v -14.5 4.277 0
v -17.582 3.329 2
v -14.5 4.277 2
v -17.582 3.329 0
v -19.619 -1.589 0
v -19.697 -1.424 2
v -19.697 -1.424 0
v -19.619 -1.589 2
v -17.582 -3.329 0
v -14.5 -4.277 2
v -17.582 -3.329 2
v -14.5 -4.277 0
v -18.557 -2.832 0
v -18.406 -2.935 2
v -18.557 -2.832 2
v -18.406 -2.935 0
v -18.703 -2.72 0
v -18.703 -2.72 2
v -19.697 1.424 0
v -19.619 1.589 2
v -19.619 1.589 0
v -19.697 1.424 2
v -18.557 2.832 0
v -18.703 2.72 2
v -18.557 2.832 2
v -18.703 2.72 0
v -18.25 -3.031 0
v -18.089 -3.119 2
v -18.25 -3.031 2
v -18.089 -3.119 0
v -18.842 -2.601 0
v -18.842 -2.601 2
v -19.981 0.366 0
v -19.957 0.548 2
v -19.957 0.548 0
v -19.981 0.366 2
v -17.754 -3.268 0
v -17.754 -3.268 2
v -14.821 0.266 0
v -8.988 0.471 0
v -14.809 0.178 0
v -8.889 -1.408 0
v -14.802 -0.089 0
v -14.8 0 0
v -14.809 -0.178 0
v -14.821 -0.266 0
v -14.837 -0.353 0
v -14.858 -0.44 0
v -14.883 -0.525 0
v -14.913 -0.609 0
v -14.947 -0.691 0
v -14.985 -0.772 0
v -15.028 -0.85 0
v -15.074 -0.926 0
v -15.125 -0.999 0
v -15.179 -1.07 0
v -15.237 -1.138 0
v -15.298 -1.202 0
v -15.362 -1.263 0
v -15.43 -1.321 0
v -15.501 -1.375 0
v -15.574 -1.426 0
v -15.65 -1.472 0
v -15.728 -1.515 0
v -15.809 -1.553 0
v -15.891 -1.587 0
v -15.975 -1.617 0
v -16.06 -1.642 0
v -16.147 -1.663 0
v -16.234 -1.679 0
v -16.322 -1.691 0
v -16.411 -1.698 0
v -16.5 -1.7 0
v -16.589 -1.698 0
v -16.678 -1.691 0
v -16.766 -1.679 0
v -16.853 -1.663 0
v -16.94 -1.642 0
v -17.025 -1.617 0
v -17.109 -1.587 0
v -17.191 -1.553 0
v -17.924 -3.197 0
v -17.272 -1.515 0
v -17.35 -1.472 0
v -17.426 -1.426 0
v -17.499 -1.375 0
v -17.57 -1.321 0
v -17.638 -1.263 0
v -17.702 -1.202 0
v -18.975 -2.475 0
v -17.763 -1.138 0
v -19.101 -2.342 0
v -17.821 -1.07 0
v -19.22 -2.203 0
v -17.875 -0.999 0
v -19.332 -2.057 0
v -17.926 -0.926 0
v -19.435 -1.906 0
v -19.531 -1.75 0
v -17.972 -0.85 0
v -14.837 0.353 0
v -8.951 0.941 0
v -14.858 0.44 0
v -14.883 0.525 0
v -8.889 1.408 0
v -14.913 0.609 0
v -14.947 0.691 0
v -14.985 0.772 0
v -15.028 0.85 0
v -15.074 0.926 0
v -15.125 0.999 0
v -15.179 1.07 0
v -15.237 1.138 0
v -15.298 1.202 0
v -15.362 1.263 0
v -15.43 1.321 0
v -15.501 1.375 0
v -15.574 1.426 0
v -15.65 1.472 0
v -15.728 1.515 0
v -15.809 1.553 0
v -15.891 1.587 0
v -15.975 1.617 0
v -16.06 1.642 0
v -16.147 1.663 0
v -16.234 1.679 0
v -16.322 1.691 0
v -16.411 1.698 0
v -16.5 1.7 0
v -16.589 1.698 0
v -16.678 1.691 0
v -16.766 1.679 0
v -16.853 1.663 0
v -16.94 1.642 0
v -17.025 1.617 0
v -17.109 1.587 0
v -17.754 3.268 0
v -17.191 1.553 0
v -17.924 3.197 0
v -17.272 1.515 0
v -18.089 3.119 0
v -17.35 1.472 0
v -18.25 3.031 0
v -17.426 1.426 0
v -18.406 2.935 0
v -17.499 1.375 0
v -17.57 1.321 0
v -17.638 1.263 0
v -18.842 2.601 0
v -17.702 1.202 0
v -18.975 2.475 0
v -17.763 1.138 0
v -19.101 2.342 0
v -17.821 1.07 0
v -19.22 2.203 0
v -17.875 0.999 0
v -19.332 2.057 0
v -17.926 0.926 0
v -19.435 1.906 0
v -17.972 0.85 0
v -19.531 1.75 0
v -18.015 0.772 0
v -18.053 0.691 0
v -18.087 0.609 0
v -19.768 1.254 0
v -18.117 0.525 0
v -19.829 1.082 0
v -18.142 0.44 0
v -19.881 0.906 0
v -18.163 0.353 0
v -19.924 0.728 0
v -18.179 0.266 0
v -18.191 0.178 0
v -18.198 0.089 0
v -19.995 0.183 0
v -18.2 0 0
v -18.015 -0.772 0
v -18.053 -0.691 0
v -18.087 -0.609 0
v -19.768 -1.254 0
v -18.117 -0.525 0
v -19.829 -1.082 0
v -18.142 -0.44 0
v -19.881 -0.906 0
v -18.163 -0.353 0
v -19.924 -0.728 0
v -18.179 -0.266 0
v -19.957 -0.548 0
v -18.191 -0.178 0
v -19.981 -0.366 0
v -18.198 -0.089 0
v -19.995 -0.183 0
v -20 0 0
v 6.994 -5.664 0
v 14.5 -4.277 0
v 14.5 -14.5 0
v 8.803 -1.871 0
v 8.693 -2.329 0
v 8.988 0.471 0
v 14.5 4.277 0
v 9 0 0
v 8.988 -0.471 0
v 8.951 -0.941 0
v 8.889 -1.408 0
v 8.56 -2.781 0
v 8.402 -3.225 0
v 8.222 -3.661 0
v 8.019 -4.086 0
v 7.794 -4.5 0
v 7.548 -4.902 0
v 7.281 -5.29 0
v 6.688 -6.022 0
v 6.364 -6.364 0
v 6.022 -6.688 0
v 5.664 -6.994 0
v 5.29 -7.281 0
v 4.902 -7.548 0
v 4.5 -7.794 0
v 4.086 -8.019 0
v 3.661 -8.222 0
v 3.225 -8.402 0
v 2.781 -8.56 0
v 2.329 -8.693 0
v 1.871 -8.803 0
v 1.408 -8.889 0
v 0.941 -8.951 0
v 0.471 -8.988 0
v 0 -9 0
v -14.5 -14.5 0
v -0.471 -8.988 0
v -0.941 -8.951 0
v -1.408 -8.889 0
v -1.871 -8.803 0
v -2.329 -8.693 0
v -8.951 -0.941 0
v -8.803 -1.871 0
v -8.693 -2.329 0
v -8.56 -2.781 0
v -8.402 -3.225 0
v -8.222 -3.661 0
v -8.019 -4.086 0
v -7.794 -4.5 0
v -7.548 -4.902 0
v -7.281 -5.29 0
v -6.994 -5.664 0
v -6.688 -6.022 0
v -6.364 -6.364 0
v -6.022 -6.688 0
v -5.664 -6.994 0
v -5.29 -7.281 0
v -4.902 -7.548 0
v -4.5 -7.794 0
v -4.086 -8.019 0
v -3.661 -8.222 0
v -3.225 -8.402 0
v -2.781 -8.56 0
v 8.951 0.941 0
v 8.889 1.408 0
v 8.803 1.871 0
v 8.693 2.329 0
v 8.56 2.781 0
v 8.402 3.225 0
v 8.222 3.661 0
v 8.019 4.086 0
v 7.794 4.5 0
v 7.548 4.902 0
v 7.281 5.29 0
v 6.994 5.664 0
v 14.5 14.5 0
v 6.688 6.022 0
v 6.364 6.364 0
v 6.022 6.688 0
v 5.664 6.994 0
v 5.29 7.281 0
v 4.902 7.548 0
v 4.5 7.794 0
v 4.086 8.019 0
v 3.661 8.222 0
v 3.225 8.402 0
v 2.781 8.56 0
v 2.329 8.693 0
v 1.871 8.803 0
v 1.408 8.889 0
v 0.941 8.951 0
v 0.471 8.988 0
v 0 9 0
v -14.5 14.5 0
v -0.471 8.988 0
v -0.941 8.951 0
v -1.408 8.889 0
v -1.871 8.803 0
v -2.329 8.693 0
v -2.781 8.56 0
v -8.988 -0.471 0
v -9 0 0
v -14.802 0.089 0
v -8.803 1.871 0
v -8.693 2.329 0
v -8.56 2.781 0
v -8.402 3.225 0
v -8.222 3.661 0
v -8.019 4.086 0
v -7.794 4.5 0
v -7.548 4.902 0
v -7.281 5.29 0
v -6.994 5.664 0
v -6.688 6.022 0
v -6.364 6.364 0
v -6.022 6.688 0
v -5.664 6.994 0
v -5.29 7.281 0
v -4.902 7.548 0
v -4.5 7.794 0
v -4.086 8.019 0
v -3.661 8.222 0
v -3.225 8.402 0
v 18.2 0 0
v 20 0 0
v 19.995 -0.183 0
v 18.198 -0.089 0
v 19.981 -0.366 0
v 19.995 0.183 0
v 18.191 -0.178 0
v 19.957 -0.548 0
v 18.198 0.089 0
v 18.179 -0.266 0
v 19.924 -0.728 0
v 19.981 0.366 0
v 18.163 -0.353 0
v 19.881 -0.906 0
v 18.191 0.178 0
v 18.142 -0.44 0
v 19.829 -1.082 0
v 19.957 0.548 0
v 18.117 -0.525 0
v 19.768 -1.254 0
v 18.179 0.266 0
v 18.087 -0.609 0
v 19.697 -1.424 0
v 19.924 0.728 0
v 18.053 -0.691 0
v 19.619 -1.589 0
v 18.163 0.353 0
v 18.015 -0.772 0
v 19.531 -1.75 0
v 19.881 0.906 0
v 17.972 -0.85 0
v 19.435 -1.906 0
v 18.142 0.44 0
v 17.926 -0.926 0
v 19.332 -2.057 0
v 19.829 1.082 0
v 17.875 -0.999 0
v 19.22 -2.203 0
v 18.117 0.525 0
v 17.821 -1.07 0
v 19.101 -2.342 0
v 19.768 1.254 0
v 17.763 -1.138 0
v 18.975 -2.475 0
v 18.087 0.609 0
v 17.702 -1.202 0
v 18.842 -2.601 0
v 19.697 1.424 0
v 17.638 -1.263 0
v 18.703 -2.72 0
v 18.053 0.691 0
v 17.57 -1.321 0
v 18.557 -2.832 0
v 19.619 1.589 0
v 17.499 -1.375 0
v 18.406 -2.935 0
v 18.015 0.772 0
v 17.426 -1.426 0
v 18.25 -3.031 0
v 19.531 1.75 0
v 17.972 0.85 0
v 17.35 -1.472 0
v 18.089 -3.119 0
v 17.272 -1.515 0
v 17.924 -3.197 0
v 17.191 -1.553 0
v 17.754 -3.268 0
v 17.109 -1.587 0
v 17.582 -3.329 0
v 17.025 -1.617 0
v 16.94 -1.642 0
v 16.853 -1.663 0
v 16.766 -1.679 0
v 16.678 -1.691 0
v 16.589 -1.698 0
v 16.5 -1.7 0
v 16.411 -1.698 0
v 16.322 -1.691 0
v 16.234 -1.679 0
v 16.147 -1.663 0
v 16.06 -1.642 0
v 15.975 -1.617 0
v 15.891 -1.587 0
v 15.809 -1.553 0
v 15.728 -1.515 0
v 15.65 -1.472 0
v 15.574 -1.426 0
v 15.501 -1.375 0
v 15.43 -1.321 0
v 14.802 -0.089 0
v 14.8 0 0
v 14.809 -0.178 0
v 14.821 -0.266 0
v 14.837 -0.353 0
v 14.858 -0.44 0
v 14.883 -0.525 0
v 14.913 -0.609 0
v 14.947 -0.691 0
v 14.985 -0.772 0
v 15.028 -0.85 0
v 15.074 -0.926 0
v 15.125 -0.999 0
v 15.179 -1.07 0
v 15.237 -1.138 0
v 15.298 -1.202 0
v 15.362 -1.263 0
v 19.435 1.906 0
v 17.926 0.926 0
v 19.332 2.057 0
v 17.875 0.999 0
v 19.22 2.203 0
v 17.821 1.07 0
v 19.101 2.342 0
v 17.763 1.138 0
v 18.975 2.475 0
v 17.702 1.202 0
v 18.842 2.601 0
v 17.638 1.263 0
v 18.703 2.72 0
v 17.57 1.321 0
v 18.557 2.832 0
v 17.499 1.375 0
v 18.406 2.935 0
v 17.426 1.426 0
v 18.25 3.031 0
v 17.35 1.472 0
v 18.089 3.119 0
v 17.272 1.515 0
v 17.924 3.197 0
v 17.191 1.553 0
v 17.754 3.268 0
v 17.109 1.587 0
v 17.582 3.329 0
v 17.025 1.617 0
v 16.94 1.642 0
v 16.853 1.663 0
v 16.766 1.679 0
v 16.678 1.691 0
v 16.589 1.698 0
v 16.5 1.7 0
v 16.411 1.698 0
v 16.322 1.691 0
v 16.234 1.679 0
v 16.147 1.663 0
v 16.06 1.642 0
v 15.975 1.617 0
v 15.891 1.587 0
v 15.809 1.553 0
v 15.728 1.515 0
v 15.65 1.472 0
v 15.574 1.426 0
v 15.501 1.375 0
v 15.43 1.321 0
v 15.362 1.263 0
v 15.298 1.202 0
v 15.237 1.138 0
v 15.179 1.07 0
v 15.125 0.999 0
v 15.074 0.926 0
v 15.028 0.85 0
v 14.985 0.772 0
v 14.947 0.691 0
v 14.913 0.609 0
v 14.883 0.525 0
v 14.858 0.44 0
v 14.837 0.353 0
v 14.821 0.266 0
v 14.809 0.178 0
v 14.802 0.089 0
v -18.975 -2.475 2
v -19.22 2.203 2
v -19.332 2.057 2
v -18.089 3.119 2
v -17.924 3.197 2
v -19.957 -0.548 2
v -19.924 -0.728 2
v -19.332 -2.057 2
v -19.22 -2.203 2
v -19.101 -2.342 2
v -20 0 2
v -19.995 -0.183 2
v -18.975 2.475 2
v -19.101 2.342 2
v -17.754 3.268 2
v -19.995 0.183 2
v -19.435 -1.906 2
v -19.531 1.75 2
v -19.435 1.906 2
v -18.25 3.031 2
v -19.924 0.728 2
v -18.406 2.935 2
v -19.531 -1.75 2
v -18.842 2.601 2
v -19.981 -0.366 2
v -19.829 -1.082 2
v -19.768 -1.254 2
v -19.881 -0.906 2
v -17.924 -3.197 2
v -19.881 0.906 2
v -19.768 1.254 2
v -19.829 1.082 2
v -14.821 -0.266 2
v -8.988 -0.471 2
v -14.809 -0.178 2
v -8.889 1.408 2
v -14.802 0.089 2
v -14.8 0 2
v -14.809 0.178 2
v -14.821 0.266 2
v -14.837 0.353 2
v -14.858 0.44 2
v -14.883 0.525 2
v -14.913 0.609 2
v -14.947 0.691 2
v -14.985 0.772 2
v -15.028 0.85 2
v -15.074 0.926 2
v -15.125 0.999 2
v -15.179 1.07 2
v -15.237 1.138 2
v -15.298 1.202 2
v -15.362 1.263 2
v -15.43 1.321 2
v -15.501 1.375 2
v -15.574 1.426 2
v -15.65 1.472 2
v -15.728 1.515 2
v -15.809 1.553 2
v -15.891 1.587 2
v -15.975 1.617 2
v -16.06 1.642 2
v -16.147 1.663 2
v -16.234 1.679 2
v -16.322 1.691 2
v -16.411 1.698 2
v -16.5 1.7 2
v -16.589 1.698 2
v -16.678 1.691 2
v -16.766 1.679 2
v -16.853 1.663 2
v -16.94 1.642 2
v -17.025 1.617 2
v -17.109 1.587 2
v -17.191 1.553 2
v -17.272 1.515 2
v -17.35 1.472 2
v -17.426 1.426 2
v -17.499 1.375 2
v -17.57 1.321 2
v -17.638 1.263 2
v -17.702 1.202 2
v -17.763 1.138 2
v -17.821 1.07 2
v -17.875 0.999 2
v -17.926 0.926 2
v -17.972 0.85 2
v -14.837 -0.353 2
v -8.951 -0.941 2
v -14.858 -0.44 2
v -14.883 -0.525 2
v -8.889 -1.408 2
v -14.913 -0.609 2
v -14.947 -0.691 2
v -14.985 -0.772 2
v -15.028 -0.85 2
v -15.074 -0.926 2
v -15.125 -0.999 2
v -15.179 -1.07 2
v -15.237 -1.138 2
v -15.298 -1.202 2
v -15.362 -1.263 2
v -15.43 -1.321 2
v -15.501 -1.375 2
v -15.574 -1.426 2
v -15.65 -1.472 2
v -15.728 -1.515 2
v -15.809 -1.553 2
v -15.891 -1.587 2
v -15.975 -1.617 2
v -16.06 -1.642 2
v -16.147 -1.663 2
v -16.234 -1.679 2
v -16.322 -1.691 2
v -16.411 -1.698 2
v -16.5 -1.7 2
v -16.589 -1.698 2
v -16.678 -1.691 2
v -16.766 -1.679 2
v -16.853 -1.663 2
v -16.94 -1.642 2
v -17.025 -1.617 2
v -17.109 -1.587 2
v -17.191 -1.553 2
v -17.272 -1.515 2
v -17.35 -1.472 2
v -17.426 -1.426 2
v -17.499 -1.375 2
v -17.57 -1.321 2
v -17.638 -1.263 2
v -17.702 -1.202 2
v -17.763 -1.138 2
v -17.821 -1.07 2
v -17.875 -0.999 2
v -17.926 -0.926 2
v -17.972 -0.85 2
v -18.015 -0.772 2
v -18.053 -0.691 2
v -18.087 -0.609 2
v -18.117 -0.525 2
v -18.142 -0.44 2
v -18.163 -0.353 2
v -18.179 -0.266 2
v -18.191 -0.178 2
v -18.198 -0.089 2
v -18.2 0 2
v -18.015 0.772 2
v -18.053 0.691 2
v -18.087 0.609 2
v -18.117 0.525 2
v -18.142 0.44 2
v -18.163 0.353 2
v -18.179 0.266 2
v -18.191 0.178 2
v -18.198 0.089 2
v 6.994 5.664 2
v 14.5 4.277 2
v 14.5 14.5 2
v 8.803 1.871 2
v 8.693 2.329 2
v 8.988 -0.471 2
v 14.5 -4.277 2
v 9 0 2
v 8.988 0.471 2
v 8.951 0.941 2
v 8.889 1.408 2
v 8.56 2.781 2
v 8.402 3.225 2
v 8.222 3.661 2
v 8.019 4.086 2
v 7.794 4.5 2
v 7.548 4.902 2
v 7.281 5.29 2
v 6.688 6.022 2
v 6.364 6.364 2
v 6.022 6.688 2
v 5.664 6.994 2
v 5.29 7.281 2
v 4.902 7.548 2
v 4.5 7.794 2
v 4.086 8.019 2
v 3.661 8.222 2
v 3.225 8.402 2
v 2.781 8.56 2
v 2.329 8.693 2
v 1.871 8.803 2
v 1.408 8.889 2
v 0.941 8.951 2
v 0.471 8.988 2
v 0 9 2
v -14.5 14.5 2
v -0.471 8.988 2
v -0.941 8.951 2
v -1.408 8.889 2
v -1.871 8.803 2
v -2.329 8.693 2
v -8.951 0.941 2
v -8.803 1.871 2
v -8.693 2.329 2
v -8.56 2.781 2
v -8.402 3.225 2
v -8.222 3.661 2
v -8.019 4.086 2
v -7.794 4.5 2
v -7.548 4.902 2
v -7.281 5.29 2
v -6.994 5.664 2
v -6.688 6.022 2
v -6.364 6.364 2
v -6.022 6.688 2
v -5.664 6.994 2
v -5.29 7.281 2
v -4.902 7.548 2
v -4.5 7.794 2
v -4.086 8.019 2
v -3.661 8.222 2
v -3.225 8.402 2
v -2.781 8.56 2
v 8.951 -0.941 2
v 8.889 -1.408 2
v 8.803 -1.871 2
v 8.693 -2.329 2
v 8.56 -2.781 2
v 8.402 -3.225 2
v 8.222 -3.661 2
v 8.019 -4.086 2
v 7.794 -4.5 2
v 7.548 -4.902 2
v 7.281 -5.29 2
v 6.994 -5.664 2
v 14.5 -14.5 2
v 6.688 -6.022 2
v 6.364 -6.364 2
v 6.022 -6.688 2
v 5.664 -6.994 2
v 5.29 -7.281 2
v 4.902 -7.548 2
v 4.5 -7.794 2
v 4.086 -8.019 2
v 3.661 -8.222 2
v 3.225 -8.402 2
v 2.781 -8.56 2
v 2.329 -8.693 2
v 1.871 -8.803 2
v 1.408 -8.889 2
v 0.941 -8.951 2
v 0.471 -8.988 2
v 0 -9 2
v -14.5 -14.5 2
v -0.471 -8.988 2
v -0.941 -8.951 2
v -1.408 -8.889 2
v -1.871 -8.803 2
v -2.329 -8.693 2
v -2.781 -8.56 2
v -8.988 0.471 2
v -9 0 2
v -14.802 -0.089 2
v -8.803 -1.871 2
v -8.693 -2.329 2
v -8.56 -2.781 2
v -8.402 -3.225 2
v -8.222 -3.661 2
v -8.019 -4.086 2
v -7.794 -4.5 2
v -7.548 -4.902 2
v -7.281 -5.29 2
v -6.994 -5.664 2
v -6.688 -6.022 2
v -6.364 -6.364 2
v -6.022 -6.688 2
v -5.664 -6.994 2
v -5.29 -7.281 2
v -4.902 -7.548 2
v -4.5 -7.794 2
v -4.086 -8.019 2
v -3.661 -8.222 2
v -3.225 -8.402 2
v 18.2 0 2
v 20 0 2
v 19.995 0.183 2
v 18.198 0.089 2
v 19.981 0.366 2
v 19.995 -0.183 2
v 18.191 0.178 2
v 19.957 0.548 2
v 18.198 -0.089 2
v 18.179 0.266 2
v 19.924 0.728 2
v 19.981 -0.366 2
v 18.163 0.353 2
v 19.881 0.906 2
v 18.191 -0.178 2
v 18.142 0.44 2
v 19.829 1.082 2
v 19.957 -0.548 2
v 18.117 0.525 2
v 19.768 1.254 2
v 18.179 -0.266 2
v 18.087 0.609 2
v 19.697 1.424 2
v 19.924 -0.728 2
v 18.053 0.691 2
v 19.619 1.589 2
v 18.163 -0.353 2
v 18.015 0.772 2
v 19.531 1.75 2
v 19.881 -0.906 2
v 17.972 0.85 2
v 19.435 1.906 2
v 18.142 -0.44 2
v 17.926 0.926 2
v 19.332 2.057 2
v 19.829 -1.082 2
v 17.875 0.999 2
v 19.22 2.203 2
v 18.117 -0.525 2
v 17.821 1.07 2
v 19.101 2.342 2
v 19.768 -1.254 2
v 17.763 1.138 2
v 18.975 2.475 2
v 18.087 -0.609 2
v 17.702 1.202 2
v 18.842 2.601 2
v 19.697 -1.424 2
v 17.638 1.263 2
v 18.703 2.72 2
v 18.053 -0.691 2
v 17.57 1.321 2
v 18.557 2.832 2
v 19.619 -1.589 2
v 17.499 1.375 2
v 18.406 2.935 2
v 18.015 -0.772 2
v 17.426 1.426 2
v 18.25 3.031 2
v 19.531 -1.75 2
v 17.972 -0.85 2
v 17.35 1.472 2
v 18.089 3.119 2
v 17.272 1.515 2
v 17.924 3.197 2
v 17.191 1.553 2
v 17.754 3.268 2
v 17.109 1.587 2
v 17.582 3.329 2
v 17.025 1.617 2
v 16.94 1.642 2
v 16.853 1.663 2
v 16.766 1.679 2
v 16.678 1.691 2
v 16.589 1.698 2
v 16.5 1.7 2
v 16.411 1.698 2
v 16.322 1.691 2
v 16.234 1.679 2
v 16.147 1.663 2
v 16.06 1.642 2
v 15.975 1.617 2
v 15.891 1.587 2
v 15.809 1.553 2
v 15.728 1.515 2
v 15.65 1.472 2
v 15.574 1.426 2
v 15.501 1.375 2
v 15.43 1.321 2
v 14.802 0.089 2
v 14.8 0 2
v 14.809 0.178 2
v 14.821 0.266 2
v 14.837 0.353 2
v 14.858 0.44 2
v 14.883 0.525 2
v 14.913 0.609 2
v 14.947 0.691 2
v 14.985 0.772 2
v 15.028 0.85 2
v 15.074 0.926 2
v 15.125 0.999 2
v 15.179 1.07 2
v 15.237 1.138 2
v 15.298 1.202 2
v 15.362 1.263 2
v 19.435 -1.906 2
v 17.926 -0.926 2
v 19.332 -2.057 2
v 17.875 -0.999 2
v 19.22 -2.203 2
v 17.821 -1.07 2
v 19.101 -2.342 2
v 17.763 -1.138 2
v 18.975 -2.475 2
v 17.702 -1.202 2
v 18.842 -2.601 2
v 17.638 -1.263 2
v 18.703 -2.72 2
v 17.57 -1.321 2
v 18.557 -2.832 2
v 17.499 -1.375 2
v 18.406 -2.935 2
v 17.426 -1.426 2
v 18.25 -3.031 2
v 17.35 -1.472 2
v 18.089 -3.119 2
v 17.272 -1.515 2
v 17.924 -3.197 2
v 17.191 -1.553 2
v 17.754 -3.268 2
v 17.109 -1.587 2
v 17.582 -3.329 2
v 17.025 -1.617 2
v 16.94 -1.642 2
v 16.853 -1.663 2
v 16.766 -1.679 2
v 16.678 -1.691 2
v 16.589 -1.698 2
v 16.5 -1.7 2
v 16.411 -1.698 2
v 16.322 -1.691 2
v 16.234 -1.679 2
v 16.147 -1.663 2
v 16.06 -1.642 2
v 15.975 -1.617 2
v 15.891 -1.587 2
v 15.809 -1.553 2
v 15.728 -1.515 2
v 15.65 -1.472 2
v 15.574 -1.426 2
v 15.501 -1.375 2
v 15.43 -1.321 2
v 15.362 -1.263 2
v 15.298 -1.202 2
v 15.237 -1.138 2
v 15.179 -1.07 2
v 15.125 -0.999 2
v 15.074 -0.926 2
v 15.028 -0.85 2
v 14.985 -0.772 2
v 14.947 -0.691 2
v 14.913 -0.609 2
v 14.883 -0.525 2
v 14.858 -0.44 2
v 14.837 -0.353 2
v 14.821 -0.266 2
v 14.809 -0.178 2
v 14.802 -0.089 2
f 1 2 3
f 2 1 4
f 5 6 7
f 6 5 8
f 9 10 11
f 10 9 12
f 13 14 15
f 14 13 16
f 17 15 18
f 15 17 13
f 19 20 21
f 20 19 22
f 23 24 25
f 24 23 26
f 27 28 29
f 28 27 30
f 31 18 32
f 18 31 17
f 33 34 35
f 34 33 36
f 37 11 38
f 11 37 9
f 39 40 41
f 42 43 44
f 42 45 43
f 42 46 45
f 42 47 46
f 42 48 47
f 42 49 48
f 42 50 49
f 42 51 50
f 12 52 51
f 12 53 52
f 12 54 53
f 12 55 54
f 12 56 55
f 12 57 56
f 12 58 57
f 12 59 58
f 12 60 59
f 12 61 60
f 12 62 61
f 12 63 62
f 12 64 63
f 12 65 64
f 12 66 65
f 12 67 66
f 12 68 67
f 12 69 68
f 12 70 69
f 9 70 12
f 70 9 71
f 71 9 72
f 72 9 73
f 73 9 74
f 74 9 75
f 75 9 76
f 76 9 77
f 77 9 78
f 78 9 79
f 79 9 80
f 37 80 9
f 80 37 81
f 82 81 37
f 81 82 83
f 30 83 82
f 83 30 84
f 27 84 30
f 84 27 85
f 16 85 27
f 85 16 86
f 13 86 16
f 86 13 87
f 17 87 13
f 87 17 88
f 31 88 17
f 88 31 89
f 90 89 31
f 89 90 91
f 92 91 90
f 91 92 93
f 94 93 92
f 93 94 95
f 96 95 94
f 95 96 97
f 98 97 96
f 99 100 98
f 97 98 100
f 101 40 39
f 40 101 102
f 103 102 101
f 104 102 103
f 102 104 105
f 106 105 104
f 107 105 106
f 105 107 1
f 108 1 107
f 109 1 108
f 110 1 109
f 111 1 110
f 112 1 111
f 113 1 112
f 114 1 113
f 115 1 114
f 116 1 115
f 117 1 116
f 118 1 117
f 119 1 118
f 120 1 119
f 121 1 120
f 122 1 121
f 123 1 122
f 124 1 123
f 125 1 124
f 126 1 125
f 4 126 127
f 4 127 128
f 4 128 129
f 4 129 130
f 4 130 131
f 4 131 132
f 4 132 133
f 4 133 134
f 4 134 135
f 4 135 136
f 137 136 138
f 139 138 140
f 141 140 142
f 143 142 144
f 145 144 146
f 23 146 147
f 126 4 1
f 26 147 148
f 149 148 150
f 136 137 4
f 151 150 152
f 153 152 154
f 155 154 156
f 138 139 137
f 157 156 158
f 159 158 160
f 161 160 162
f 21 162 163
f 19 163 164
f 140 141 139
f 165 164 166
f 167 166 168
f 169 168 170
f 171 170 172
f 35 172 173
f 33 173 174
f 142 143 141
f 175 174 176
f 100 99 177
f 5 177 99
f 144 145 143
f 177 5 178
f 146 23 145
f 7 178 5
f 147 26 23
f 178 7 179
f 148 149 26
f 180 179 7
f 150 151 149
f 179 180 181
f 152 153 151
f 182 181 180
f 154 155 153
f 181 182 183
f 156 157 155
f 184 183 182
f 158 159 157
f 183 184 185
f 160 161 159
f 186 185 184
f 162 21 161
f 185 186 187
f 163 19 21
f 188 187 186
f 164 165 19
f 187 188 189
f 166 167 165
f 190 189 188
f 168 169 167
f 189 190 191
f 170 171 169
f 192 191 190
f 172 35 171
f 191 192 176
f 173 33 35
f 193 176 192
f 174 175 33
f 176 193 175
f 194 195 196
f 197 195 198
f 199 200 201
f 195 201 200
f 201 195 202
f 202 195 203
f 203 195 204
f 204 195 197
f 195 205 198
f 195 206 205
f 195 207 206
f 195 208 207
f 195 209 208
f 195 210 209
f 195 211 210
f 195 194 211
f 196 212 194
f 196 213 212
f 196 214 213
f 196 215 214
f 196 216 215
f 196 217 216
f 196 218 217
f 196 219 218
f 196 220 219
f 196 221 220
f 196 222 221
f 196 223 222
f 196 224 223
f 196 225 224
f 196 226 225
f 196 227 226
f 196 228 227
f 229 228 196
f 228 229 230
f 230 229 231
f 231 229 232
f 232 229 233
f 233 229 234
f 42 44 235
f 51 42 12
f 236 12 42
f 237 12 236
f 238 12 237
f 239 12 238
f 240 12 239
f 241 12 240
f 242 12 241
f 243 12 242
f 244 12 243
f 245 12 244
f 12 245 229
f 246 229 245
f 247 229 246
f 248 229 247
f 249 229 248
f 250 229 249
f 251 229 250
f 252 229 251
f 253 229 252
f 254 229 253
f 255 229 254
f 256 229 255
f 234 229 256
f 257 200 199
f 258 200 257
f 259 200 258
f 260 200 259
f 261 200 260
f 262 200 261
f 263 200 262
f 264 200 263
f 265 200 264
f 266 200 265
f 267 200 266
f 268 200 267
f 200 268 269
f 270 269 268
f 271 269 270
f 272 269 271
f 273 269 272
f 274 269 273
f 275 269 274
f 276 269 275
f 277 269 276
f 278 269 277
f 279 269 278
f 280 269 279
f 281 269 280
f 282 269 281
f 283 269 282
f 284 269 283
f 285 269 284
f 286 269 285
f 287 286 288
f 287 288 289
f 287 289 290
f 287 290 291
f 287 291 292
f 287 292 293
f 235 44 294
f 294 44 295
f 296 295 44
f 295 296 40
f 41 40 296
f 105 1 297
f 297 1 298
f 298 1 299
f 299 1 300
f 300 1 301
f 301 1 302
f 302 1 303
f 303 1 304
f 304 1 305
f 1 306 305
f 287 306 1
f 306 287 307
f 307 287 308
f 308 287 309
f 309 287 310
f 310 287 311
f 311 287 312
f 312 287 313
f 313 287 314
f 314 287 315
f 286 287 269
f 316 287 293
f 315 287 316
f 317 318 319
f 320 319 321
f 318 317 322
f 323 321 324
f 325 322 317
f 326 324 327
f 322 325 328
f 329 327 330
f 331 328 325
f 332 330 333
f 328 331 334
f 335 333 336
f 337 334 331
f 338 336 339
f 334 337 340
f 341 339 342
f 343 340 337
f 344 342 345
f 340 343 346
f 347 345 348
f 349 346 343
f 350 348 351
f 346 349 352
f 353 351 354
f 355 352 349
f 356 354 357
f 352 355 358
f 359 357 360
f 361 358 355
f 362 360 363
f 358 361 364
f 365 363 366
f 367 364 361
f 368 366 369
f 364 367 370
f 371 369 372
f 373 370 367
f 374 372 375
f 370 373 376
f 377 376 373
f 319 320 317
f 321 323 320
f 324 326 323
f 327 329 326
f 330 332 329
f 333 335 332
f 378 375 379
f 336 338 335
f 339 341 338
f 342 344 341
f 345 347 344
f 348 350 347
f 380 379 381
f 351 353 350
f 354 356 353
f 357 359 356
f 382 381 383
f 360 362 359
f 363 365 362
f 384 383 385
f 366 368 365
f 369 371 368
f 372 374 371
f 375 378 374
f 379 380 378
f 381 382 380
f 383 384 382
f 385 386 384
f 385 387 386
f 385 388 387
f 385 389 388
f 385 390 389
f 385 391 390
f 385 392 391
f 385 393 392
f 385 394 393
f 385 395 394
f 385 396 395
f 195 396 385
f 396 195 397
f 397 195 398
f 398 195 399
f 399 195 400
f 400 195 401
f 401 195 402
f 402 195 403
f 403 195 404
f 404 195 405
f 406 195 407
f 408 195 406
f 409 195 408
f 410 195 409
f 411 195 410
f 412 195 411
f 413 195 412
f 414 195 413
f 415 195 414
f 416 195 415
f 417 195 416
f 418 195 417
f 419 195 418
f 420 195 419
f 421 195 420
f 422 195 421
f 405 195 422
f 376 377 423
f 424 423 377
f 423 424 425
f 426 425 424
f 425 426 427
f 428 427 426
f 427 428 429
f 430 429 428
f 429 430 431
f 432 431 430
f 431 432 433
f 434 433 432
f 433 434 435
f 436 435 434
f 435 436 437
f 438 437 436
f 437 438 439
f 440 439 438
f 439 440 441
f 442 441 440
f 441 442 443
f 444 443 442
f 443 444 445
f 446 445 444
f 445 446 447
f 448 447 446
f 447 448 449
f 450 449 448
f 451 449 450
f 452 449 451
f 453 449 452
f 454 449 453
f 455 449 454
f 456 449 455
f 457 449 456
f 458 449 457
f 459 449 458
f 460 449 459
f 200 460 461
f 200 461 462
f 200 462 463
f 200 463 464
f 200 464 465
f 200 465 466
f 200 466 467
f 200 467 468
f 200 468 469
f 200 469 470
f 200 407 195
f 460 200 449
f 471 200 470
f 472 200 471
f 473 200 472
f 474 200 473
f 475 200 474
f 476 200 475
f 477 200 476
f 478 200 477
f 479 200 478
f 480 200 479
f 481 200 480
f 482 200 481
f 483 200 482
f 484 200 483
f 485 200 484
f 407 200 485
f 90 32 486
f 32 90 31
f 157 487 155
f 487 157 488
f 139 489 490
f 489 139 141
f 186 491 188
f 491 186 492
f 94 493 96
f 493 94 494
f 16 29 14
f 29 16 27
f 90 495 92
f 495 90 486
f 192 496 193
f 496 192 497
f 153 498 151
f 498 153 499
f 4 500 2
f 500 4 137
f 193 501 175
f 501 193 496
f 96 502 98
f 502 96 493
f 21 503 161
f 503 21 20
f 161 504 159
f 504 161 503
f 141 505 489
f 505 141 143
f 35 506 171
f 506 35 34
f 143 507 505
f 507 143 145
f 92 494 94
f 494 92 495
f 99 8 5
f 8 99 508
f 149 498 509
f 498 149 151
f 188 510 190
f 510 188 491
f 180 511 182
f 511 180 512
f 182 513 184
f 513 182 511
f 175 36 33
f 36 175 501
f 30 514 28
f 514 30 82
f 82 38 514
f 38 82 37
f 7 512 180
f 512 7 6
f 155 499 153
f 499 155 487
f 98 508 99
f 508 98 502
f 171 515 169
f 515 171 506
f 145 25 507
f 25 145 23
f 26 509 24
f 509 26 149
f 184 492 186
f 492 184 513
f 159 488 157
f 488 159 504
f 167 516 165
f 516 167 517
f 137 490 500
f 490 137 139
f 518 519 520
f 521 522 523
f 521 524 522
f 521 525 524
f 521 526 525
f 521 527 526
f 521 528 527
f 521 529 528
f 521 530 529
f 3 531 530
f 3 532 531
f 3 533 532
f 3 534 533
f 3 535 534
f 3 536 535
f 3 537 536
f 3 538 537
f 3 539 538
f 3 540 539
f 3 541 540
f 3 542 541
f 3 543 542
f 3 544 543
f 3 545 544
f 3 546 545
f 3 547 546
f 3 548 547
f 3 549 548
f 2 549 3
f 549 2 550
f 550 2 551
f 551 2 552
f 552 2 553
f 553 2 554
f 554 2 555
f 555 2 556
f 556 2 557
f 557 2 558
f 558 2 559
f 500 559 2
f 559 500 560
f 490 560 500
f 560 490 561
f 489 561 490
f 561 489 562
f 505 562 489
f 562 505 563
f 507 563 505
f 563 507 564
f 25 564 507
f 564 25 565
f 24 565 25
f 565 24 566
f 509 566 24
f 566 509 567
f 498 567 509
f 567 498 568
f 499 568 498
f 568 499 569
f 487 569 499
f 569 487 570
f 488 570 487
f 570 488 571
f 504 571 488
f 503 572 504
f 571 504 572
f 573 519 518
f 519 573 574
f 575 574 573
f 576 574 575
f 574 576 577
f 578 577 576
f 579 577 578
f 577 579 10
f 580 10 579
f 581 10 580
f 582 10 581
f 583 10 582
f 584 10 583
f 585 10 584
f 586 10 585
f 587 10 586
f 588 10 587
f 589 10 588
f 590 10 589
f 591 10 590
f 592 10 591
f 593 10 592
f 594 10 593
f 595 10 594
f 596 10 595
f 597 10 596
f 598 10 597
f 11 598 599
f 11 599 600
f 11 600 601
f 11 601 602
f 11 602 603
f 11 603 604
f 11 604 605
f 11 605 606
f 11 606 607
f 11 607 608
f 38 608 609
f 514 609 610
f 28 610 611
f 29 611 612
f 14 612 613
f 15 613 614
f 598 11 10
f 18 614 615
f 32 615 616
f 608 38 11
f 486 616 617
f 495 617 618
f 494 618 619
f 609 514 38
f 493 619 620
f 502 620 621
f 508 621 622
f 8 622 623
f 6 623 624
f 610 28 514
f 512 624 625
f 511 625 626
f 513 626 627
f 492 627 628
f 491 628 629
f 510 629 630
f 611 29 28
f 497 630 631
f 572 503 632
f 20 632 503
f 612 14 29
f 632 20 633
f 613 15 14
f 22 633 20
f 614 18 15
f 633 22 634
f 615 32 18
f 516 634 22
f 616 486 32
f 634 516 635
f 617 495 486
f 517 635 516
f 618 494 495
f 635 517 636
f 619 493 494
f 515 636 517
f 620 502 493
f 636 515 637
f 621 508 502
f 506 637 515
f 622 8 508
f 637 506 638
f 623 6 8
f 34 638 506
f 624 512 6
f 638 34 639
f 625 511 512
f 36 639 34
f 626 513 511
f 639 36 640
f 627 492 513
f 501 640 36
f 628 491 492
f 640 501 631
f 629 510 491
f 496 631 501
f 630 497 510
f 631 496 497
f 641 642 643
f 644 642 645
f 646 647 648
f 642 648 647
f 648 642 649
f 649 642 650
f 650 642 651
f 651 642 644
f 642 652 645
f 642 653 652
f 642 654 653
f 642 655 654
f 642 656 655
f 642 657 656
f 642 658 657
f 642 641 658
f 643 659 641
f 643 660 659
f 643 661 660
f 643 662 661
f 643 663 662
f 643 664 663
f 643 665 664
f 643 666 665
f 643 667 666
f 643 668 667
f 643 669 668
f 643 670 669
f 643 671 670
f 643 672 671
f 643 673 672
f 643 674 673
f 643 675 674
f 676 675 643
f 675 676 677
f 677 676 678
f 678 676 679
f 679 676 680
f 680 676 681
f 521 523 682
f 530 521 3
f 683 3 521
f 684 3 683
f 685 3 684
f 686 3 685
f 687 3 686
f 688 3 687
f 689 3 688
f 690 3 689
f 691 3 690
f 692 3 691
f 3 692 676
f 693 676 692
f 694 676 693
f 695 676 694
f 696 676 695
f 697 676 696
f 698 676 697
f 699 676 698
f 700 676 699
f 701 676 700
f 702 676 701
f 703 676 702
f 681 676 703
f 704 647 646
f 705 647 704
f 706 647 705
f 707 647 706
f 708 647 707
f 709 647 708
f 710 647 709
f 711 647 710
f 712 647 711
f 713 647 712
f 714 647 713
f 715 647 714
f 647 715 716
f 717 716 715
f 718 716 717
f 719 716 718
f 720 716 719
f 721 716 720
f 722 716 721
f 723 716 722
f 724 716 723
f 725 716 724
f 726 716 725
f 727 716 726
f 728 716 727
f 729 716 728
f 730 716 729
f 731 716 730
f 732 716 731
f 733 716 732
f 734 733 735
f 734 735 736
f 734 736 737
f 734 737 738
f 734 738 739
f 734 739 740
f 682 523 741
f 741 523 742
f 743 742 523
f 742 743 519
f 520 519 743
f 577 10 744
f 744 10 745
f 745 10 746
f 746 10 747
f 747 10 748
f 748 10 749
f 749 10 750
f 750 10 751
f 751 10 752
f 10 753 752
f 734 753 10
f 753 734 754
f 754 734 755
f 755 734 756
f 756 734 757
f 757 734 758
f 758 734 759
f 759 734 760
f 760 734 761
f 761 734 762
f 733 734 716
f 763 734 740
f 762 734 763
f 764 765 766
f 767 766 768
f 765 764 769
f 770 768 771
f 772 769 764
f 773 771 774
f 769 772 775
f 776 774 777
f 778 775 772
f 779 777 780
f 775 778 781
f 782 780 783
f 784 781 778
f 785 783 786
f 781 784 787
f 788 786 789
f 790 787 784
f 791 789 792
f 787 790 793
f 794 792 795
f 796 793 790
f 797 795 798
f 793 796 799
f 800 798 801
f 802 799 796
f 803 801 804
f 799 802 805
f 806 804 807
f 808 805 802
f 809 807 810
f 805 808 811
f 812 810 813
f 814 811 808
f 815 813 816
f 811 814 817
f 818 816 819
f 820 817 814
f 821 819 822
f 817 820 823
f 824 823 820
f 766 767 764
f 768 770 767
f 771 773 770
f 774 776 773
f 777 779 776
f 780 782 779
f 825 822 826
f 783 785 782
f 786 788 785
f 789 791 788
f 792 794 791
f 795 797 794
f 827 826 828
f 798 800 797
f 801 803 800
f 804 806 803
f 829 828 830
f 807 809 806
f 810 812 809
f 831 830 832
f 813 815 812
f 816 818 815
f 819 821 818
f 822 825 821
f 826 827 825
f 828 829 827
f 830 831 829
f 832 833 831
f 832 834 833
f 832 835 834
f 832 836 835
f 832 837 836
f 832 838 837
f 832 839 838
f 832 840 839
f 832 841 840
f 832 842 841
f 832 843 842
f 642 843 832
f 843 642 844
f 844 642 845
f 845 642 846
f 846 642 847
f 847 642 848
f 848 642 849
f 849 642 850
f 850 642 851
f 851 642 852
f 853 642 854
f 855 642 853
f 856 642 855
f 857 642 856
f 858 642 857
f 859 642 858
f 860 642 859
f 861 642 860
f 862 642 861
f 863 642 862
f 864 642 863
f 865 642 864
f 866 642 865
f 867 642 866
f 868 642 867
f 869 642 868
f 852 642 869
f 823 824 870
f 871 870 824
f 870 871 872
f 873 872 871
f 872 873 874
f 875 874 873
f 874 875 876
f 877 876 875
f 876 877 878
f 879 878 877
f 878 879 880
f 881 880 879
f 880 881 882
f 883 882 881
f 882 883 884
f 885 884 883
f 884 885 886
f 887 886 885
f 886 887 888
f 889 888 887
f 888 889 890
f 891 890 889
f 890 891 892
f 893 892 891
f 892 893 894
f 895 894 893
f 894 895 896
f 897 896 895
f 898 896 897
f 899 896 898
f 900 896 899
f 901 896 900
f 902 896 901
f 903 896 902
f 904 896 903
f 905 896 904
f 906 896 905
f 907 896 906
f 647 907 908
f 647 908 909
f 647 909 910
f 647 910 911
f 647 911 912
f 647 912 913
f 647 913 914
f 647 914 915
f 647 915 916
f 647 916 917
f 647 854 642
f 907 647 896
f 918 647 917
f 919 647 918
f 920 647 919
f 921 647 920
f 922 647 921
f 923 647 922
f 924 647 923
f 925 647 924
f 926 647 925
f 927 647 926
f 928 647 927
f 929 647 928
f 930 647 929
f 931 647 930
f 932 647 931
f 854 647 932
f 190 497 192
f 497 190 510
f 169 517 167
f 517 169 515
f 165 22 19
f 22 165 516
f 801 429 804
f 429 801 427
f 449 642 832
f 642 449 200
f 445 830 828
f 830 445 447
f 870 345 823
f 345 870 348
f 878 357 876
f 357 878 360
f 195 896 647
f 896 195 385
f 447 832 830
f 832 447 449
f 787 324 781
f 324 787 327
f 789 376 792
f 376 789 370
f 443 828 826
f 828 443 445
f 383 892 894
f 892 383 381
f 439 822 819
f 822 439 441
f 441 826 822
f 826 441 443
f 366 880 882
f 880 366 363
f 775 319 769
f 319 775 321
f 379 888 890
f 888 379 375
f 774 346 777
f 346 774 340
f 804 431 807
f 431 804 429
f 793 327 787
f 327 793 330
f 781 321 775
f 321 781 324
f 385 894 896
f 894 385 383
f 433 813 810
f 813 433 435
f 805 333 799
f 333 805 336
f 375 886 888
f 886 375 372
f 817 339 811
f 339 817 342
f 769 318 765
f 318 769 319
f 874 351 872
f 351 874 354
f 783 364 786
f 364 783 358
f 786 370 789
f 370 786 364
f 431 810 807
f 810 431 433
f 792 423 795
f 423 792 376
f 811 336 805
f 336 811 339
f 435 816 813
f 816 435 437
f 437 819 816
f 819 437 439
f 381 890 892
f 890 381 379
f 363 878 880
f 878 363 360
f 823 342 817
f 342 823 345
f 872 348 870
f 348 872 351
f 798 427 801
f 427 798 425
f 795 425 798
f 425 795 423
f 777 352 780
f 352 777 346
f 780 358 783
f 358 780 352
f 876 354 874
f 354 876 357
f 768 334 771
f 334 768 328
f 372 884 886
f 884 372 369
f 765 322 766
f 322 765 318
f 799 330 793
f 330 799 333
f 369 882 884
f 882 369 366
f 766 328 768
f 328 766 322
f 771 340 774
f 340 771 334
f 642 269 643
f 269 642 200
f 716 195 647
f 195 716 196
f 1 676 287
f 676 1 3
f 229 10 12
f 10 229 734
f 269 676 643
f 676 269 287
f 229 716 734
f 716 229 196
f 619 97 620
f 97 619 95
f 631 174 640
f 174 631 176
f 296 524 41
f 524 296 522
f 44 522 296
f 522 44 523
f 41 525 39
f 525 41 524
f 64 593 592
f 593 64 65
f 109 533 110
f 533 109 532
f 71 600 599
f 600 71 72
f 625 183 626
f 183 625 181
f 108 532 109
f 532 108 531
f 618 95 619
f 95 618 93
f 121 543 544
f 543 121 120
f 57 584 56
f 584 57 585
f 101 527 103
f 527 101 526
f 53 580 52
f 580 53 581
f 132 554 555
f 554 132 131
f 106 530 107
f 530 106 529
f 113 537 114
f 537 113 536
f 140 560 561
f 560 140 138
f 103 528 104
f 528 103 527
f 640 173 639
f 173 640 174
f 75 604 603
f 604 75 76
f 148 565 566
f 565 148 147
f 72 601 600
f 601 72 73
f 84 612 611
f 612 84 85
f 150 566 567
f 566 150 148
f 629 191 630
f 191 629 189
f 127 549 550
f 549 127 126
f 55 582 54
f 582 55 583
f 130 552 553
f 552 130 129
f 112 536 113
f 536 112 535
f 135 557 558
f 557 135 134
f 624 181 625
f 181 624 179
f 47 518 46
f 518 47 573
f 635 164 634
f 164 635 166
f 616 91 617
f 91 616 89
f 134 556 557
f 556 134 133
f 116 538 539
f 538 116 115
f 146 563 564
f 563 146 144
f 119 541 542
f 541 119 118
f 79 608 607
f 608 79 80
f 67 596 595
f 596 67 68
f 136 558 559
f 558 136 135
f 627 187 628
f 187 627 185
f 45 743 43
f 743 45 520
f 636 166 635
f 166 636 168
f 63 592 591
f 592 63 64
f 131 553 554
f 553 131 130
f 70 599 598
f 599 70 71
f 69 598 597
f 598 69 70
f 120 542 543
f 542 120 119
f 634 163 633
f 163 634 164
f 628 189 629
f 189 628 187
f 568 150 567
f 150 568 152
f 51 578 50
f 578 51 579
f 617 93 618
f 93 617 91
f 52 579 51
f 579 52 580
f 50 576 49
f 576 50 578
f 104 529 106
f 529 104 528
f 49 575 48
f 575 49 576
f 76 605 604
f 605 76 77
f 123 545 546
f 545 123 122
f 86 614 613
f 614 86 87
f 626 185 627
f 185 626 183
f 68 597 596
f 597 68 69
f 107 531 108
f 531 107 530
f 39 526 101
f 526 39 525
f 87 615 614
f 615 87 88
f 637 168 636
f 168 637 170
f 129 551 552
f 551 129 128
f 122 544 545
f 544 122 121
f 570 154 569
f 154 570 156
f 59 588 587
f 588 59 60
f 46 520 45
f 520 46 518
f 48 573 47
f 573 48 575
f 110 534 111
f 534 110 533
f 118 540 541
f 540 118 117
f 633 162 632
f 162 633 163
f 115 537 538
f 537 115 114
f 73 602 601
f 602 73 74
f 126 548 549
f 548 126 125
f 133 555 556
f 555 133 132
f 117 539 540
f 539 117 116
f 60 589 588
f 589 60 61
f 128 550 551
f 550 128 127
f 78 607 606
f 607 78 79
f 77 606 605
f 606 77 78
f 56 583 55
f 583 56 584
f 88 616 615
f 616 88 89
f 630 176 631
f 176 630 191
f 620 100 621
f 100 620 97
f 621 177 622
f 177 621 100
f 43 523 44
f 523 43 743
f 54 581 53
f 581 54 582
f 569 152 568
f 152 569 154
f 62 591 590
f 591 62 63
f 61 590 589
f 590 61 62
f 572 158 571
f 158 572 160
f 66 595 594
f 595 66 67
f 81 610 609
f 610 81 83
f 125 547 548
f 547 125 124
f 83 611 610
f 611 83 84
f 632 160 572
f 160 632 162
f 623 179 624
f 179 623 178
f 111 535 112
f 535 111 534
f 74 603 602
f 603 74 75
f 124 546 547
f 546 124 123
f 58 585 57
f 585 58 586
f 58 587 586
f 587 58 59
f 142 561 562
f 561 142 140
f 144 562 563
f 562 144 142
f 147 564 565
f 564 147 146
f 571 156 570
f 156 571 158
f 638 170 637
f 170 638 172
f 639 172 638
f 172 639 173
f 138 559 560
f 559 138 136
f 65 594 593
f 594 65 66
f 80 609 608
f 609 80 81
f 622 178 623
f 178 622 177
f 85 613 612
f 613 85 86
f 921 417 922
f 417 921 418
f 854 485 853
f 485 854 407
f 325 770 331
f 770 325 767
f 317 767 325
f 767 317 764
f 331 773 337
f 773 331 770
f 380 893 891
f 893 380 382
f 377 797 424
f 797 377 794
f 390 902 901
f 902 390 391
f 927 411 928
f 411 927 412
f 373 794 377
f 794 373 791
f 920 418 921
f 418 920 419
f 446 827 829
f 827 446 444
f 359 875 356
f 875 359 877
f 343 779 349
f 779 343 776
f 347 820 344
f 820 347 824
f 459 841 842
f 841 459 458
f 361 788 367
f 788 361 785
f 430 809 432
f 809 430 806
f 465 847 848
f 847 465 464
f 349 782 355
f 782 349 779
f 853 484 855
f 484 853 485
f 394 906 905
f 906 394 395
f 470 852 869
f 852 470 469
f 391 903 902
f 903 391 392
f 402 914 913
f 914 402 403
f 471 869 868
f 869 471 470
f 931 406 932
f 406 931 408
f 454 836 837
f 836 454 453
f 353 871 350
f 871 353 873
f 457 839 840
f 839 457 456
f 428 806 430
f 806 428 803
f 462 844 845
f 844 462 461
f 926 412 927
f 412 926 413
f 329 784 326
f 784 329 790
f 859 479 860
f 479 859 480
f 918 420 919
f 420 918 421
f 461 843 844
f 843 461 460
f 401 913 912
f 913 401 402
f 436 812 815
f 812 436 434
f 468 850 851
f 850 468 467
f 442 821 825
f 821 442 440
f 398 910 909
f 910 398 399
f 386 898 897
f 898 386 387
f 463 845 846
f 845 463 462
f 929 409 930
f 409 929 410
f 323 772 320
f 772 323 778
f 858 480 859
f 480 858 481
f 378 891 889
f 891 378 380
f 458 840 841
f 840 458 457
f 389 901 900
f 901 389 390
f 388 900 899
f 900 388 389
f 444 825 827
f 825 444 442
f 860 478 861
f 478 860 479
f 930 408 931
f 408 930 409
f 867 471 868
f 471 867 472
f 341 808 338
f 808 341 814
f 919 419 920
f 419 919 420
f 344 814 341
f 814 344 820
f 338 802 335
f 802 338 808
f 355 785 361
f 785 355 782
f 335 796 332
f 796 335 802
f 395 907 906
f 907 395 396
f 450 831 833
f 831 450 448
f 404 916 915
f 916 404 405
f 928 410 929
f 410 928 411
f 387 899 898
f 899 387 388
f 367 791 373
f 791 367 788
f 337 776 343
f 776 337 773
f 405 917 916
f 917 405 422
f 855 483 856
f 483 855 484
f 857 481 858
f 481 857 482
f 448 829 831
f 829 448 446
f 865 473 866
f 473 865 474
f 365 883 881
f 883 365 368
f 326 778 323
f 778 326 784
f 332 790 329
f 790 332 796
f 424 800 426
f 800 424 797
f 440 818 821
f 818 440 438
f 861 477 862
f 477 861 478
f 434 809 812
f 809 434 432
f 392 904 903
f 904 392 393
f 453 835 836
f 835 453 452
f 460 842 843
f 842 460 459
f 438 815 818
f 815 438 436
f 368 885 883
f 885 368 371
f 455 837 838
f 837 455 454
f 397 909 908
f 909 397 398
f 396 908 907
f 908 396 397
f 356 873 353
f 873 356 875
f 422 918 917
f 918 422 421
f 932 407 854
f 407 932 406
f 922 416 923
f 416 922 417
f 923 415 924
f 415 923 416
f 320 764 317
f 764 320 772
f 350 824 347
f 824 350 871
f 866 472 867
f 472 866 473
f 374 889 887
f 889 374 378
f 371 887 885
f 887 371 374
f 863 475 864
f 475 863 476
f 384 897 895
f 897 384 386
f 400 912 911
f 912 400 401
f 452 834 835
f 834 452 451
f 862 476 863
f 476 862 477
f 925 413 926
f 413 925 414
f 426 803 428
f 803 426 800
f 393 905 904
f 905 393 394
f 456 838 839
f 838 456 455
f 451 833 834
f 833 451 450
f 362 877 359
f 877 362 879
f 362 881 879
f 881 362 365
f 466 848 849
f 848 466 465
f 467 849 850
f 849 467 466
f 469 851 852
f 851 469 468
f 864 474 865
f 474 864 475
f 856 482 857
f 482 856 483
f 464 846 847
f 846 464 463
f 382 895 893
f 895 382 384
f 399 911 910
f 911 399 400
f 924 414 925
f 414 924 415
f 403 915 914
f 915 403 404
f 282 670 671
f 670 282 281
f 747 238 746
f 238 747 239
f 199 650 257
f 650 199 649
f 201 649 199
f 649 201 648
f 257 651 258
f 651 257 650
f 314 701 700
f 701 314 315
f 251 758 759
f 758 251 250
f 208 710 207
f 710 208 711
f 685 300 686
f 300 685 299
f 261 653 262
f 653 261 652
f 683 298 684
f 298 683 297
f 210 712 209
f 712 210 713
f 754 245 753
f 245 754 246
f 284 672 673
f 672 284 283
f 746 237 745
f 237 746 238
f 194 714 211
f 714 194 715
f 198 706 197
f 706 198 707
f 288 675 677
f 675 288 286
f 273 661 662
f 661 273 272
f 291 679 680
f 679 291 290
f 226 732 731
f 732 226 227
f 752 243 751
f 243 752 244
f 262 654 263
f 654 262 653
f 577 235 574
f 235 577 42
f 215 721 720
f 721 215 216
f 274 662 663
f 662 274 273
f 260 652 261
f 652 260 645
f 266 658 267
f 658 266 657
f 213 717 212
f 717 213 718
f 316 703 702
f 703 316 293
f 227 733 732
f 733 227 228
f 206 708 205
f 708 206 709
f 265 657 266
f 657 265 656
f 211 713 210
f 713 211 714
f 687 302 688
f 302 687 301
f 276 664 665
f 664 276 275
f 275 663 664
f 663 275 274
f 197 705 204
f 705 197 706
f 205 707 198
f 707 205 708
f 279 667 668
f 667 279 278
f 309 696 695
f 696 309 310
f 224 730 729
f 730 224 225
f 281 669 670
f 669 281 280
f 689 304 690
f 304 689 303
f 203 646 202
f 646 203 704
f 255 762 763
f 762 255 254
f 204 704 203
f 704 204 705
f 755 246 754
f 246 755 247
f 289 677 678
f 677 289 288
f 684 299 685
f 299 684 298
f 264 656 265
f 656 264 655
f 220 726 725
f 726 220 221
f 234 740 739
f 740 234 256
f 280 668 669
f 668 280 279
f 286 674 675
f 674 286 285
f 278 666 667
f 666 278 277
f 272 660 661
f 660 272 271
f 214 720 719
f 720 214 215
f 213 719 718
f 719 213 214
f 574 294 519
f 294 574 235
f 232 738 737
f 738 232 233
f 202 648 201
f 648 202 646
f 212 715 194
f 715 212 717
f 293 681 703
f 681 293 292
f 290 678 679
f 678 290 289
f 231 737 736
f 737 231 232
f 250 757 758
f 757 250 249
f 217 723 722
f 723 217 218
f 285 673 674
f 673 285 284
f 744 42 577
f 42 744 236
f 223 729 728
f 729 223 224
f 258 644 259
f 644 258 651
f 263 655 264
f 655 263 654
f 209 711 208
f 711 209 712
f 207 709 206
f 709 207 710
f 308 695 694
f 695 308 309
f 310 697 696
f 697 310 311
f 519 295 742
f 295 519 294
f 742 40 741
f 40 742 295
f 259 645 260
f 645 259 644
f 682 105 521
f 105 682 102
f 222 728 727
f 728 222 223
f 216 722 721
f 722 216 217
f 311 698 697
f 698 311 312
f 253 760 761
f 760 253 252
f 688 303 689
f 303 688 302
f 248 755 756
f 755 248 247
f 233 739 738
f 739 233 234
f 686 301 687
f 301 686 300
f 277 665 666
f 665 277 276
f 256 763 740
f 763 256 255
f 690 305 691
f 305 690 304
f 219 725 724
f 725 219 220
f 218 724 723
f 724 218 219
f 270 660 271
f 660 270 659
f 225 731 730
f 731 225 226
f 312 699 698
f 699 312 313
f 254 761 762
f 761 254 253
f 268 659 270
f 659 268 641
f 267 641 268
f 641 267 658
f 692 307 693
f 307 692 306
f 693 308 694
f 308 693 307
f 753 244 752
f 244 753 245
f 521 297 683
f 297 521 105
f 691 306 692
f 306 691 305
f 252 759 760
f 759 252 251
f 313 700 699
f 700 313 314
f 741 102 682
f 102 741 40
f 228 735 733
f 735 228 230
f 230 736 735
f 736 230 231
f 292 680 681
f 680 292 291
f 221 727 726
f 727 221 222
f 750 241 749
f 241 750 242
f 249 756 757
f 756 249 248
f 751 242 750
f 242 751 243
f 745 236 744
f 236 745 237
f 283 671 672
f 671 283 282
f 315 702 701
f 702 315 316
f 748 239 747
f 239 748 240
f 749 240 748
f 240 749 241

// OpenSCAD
// ring print. Prints as shown.
include <model.scad>
view = "ring_print";
